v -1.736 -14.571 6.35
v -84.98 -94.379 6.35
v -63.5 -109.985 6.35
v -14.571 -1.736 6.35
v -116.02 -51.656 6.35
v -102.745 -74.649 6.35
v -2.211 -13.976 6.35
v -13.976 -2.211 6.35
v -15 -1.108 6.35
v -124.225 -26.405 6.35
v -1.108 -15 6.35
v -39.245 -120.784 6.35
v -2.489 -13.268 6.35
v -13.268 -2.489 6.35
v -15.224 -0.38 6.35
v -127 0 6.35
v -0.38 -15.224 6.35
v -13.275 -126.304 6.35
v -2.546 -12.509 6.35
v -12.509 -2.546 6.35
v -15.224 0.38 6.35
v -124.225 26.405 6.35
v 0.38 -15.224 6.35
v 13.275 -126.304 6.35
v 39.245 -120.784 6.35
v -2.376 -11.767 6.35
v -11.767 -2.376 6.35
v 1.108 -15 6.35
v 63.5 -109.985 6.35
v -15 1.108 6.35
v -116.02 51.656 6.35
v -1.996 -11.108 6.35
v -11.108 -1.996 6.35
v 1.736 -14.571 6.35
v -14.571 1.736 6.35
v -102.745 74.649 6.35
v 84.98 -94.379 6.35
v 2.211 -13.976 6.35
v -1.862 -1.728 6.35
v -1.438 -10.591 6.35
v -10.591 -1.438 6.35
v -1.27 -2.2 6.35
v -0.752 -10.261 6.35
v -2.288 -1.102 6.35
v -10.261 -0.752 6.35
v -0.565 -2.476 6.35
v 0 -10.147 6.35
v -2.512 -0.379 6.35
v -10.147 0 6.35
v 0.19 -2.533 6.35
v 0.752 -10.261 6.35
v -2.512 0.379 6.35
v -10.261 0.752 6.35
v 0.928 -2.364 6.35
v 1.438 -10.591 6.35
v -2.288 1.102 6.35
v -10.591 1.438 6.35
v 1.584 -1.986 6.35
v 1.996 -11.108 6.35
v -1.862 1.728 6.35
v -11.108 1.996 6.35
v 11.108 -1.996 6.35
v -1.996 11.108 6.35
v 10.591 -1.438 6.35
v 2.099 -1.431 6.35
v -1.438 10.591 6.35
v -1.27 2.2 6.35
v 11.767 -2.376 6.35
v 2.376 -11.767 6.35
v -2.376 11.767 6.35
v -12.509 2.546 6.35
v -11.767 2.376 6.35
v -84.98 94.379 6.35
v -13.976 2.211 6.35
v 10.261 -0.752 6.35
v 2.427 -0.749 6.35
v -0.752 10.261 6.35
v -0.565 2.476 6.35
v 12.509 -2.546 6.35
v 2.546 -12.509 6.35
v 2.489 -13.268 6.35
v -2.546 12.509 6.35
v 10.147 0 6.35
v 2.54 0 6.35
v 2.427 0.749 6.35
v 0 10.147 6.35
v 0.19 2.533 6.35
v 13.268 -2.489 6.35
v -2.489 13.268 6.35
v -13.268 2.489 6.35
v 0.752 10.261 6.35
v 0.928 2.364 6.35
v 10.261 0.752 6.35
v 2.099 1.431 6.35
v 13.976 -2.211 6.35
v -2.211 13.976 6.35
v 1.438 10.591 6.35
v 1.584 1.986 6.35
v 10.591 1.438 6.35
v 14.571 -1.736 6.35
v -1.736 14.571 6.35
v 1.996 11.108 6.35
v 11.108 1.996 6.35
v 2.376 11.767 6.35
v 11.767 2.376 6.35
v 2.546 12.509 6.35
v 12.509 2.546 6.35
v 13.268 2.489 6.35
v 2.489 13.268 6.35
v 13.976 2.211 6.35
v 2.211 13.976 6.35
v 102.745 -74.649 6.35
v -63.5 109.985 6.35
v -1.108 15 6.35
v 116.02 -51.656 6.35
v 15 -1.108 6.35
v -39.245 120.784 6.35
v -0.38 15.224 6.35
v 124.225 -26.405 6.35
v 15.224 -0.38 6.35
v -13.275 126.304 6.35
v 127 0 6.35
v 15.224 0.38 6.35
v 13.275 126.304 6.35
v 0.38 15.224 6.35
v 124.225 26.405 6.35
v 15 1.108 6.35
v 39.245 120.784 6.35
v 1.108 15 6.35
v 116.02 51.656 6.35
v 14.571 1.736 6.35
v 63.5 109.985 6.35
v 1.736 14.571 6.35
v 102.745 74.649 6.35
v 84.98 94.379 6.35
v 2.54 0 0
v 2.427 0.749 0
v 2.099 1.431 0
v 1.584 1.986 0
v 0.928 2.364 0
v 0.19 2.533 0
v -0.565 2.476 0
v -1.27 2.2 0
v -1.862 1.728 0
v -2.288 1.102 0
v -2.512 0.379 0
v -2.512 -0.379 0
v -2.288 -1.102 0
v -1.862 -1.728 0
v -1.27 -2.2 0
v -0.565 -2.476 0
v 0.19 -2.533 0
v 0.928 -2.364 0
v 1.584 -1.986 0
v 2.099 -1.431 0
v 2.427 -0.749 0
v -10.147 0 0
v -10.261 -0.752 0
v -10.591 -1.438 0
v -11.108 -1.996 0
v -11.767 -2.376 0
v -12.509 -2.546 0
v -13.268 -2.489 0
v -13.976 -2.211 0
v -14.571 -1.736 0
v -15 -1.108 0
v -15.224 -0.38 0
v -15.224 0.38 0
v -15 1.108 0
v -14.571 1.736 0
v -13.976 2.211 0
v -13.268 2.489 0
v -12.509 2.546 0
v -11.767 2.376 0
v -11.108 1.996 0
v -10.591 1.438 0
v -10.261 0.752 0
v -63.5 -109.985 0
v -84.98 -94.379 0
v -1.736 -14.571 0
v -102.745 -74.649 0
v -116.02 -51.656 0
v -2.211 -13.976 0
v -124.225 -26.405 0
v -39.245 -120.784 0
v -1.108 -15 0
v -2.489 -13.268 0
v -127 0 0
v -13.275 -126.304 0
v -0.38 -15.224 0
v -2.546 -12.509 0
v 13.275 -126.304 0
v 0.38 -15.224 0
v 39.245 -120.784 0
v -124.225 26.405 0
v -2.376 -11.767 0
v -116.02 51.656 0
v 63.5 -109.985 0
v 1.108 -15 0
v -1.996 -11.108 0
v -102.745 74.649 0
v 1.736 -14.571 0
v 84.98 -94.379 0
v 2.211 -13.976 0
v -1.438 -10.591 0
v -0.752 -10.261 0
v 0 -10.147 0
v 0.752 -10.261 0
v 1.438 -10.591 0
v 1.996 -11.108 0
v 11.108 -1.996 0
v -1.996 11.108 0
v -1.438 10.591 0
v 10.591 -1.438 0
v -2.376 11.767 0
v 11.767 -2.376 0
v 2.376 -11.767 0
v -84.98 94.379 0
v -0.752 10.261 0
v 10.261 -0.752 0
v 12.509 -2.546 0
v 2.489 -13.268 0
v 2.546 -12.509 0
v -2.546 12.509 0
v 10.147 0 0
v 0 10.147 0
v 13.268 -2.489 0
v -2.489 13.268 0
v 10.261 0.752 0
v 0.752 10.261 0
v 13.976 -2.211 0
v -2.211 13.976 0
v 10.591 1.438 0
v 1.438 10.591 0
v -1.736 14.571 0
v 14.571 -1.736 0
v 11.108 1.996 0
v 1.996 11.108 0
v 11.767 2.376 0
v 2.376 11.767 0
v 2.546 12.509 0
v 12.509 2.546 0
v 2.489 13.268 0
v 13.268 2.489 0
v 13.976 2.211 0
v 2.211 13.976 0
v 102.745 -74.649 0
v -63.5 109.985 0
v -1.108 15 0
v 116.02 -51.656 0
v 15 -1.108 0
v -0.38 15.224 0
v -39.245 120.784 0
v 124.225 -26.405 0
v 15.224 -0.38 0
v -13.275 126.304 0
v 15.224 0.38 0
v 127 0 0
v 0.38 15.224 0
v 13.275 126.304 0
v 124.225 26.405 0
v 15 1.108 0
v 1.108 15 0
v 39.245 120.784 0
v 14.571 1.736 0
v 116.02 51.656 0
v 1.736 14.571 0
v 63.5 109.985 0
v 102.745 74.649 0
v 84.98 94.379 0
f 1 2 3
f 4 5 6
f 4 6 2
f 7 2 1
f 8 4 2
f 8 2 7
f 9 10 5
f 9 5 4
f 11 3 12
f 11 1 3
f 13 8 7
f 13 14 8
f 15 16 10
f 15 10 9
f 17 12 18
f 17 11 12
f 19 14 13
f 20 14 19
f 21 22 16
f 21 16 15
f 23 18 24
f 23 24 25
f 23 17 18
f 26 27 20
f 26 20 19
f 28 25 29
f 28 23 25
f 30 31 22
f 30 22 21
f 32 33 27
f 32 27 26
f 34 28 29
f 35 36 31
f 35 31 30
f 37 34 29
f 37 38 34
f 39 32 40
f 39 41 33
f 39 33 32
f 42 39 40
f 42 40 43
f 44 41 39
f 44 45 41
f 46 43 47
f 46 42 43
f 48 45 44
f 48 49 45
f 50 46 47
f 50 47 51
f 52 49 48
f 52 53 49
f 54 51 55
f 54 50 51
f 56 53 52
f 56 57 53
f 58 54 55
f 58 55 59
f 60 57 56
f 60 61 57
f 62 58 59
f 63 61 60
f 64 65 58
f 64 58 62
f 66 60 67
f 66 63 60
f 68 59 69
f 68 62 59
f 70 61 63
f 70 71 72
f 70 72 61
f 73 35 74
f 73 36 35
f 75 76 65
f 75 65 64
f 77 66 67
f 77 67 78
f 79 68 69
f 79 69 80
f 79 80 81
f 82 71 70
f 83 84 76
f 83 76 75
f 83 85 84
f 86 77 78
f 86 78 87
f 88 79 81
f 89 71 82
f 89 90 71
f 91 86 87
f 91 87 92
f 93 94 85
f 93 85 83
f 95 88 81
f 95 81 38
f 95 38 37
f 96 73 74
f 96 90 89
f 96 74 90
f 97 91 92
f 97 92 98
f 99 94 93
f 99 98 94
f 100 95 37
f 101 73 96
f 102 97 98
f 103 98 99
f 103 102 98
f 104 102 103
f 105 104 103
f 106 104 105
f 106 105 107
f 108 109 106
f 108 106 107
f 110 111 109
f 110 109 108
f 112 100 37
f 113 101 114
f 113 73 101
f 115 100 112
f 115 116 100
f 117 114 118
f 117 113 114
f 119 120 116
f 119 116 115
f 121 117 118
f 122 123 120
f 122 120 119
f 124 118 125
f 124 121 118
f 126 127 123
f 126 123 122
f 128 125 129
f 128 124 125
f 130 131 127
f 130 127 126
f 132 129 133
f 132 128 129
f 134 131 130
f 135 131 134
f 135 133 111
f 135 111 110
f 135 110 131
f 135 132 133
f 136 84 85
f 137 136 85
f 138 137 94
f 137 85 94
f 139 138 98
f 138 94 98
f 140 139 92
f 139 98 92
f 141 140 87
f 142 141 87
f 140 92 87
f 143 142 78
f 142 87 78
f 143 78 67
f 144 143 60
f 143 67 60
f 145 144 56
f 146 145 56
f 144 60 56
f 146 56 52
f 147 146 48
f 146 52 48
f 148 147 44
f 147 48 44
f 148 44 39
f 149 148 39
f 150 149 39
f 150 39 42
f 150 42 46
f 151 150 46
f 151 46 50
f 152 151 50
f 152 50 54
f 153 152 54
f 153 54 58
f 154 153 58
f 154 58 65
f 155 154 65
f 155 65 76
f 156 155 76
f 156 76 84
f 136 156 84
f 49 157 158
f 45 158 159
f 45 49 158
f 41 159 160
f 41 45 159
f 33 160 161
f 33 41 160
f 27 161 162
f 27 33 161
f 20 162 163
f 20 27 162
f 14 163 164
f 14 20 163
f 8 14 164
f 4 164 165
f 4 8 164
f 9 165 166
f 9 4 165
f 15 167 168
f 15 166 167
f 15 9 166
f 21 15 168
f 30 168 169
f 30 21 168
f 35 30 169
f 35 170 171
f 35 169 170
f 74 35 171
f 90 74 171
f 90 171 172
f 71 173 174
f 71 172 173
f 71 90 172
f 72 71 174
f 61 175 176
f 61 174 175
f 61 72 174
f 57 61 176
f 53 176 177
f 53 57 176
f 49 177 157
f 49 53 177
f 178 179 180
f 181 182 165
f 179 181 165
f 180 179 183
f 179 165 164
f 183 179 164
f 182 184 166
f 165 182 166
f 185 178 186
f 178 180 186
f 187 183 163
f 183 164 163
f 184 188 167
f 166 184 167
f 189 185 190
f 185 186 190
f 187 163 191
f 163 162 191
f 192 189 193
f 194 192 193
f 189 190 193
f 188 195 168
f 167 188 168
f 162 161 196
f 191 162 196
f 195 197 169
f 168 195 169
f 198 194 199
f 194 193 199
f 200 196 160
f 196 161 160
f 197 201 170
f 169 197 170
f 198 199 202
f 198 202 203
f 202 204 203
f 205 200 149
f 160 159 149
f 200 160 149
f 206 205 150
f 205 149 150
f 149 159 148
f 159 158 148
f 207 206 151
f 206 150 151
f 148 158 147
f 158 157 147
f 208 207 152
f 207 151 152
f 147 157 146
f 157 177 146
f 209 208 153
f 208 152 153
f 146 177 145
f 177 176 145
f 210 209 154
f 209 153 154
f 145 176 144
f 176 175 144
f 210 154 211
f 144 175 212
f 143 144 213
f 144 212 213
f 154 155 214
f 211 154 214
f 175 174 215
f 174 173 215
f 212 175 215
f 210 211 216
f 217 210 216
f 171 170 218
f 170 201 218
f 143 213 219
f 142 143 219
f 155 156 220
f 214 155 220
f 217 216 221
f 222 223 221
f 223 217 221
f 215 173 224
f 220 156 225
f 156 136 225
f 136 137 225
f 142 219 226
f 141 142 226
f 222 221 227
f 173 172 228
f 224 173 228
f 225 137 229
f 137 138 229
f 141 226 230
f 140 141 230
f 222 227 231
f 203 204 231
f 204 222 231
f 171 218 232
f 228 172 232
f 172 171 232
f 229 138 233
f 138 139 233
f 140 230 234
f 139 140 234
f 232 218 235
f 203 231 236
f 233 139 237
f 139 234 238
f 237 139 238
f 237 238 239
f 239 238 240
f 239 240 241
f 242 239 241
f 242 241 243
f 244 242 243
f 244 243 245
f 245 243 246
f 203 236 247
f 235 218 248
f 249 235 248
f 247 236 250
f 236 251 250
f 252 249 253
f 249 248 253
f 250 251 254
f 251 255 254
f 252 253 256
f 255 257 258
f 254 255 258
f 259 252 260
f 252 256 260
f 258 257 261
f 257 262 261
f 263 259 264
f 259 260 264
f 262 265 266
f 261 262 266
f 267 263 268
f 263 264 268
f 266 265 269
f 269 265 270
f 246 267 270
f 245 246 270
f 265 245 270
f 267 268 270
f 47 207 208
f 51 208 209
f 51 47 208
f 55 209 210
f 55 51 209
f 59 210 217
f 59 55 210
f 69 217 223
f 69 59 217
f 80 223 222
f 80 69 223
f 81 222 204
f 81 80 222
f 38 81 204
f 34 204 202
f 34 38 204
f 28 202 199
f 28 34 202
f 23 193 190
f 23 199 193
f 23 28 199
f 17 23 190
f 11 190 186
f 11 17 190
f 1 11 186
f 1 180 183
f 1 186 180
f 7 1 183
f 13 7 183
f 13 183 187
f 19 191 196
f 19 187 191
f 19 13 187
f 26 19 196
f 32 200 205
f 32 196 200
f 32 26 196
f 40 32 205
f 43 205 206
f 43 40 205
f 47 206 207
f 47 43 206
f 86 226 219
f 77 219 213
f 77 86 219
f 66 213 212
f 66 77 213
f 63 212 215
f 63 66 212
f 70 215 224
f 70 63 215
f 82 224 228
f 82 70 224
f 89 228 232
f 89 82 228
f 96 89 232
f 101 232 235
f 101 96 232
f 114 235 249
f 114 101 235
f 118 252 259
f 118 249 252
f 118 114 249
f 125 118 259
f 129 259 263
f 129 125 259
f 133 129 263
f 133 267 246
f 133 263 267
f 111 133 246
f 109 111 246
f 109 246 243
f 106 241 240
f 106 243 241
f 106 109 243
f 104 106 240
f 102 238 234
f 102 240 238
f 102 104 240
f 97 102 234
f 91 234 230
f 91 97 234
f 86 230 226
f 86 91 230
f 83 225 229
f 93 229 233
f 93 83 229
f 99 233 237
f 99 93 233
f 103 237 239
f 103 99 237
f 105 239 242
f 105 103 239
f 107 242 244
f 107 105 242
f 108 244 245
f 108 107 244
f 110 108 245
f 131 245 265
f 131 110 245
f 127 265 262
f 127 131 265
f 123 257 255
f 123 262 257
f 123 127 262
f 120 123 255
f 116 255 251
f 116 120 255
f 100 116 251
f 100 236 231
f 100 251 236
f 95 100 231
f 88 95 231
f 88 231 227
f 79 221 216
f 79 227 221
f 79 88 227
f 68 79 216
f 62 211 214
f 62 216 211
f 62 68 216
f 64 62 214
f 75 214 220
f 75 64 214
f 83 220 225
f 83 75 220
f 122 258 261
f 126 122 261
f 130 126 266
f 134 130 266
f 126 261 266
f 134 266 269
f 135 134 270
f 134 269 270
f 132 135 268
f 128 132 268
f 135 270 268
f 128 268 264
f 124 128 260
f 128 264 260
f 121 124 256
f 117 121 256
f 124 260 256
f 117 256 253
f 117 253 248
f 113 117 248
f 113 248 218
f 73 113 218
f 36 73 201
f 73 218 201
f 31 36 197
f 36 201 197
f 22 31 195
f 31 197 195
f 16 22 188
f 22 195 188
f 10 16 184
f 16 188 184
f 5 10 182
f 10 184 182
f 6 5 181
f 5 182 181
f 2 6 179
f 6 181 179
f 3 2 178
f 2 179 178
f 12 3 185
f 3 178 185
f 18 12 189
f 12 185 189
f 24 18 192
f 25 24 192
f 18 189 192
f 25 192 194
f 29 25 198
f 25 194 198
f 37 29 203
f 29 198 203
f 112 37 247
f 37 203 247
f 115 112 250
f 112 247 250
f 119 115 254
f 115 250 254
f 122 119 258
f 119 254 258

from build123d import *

# Parameters (mm, degrees)
SKETCH1_R           = 127
BOSS_EXTRUDE1_DEPTH = 6.35
SKETCH2_R           = 2.54
CUT_EXTRUDE1_DEPTH  = 7.35
CIRPATTERN1_COUNT   = 4


with BuildPart() as part:
    # Sketch1 → Boss-Extrude1 (new body)
    with BuildSketch(Plane.XY):
        Circle(SKETCH1_R)
    extrude(amount=BOSS_EXTRUDE1_DEPTH)

    # Sketch2 → Cut-Extrude1 (cut, through all)
    with BuildSketch(Plane.XY.offset(6.35)):
        Circle(SKETCH2_R)
    extrude(amount=-CUT_EXTRUDE1_DEPTH, mode=Mode.SUBTRACT)

    # Sketch5 → #10 Clearance Hole1 (revolve, cut)
    with BuildSketch(Plane(origin=(0, 12.7, 6.35), x_dir=(0, -1, 0), z_dir=(1, 0, 0))):
        Polygon((0, 0), (0, 11.058816902), (2.5527, 9.525), (2.5527, 0), align=None)
    f_10_clearance_hole1 = revolve(axis=Axis((0, 12.7, 12.7), (0, 0, -1)), mode=Mode.SUBTRACT)

    # CirPattern1: #10 Clearance Hole1 ×4 about axis
    cirpattern1_axis = Axis((0, 0, 0), (0, 0, 1))
    for i in range(1, CIRPATTERN1_COUNT):
        add(f_10_clearance_hole1.rotate(cirpattern1_axis, i * 360 / CIRPATTERN1_COUNT), mode=Mode.SUBTRACT)


solid = part.part
